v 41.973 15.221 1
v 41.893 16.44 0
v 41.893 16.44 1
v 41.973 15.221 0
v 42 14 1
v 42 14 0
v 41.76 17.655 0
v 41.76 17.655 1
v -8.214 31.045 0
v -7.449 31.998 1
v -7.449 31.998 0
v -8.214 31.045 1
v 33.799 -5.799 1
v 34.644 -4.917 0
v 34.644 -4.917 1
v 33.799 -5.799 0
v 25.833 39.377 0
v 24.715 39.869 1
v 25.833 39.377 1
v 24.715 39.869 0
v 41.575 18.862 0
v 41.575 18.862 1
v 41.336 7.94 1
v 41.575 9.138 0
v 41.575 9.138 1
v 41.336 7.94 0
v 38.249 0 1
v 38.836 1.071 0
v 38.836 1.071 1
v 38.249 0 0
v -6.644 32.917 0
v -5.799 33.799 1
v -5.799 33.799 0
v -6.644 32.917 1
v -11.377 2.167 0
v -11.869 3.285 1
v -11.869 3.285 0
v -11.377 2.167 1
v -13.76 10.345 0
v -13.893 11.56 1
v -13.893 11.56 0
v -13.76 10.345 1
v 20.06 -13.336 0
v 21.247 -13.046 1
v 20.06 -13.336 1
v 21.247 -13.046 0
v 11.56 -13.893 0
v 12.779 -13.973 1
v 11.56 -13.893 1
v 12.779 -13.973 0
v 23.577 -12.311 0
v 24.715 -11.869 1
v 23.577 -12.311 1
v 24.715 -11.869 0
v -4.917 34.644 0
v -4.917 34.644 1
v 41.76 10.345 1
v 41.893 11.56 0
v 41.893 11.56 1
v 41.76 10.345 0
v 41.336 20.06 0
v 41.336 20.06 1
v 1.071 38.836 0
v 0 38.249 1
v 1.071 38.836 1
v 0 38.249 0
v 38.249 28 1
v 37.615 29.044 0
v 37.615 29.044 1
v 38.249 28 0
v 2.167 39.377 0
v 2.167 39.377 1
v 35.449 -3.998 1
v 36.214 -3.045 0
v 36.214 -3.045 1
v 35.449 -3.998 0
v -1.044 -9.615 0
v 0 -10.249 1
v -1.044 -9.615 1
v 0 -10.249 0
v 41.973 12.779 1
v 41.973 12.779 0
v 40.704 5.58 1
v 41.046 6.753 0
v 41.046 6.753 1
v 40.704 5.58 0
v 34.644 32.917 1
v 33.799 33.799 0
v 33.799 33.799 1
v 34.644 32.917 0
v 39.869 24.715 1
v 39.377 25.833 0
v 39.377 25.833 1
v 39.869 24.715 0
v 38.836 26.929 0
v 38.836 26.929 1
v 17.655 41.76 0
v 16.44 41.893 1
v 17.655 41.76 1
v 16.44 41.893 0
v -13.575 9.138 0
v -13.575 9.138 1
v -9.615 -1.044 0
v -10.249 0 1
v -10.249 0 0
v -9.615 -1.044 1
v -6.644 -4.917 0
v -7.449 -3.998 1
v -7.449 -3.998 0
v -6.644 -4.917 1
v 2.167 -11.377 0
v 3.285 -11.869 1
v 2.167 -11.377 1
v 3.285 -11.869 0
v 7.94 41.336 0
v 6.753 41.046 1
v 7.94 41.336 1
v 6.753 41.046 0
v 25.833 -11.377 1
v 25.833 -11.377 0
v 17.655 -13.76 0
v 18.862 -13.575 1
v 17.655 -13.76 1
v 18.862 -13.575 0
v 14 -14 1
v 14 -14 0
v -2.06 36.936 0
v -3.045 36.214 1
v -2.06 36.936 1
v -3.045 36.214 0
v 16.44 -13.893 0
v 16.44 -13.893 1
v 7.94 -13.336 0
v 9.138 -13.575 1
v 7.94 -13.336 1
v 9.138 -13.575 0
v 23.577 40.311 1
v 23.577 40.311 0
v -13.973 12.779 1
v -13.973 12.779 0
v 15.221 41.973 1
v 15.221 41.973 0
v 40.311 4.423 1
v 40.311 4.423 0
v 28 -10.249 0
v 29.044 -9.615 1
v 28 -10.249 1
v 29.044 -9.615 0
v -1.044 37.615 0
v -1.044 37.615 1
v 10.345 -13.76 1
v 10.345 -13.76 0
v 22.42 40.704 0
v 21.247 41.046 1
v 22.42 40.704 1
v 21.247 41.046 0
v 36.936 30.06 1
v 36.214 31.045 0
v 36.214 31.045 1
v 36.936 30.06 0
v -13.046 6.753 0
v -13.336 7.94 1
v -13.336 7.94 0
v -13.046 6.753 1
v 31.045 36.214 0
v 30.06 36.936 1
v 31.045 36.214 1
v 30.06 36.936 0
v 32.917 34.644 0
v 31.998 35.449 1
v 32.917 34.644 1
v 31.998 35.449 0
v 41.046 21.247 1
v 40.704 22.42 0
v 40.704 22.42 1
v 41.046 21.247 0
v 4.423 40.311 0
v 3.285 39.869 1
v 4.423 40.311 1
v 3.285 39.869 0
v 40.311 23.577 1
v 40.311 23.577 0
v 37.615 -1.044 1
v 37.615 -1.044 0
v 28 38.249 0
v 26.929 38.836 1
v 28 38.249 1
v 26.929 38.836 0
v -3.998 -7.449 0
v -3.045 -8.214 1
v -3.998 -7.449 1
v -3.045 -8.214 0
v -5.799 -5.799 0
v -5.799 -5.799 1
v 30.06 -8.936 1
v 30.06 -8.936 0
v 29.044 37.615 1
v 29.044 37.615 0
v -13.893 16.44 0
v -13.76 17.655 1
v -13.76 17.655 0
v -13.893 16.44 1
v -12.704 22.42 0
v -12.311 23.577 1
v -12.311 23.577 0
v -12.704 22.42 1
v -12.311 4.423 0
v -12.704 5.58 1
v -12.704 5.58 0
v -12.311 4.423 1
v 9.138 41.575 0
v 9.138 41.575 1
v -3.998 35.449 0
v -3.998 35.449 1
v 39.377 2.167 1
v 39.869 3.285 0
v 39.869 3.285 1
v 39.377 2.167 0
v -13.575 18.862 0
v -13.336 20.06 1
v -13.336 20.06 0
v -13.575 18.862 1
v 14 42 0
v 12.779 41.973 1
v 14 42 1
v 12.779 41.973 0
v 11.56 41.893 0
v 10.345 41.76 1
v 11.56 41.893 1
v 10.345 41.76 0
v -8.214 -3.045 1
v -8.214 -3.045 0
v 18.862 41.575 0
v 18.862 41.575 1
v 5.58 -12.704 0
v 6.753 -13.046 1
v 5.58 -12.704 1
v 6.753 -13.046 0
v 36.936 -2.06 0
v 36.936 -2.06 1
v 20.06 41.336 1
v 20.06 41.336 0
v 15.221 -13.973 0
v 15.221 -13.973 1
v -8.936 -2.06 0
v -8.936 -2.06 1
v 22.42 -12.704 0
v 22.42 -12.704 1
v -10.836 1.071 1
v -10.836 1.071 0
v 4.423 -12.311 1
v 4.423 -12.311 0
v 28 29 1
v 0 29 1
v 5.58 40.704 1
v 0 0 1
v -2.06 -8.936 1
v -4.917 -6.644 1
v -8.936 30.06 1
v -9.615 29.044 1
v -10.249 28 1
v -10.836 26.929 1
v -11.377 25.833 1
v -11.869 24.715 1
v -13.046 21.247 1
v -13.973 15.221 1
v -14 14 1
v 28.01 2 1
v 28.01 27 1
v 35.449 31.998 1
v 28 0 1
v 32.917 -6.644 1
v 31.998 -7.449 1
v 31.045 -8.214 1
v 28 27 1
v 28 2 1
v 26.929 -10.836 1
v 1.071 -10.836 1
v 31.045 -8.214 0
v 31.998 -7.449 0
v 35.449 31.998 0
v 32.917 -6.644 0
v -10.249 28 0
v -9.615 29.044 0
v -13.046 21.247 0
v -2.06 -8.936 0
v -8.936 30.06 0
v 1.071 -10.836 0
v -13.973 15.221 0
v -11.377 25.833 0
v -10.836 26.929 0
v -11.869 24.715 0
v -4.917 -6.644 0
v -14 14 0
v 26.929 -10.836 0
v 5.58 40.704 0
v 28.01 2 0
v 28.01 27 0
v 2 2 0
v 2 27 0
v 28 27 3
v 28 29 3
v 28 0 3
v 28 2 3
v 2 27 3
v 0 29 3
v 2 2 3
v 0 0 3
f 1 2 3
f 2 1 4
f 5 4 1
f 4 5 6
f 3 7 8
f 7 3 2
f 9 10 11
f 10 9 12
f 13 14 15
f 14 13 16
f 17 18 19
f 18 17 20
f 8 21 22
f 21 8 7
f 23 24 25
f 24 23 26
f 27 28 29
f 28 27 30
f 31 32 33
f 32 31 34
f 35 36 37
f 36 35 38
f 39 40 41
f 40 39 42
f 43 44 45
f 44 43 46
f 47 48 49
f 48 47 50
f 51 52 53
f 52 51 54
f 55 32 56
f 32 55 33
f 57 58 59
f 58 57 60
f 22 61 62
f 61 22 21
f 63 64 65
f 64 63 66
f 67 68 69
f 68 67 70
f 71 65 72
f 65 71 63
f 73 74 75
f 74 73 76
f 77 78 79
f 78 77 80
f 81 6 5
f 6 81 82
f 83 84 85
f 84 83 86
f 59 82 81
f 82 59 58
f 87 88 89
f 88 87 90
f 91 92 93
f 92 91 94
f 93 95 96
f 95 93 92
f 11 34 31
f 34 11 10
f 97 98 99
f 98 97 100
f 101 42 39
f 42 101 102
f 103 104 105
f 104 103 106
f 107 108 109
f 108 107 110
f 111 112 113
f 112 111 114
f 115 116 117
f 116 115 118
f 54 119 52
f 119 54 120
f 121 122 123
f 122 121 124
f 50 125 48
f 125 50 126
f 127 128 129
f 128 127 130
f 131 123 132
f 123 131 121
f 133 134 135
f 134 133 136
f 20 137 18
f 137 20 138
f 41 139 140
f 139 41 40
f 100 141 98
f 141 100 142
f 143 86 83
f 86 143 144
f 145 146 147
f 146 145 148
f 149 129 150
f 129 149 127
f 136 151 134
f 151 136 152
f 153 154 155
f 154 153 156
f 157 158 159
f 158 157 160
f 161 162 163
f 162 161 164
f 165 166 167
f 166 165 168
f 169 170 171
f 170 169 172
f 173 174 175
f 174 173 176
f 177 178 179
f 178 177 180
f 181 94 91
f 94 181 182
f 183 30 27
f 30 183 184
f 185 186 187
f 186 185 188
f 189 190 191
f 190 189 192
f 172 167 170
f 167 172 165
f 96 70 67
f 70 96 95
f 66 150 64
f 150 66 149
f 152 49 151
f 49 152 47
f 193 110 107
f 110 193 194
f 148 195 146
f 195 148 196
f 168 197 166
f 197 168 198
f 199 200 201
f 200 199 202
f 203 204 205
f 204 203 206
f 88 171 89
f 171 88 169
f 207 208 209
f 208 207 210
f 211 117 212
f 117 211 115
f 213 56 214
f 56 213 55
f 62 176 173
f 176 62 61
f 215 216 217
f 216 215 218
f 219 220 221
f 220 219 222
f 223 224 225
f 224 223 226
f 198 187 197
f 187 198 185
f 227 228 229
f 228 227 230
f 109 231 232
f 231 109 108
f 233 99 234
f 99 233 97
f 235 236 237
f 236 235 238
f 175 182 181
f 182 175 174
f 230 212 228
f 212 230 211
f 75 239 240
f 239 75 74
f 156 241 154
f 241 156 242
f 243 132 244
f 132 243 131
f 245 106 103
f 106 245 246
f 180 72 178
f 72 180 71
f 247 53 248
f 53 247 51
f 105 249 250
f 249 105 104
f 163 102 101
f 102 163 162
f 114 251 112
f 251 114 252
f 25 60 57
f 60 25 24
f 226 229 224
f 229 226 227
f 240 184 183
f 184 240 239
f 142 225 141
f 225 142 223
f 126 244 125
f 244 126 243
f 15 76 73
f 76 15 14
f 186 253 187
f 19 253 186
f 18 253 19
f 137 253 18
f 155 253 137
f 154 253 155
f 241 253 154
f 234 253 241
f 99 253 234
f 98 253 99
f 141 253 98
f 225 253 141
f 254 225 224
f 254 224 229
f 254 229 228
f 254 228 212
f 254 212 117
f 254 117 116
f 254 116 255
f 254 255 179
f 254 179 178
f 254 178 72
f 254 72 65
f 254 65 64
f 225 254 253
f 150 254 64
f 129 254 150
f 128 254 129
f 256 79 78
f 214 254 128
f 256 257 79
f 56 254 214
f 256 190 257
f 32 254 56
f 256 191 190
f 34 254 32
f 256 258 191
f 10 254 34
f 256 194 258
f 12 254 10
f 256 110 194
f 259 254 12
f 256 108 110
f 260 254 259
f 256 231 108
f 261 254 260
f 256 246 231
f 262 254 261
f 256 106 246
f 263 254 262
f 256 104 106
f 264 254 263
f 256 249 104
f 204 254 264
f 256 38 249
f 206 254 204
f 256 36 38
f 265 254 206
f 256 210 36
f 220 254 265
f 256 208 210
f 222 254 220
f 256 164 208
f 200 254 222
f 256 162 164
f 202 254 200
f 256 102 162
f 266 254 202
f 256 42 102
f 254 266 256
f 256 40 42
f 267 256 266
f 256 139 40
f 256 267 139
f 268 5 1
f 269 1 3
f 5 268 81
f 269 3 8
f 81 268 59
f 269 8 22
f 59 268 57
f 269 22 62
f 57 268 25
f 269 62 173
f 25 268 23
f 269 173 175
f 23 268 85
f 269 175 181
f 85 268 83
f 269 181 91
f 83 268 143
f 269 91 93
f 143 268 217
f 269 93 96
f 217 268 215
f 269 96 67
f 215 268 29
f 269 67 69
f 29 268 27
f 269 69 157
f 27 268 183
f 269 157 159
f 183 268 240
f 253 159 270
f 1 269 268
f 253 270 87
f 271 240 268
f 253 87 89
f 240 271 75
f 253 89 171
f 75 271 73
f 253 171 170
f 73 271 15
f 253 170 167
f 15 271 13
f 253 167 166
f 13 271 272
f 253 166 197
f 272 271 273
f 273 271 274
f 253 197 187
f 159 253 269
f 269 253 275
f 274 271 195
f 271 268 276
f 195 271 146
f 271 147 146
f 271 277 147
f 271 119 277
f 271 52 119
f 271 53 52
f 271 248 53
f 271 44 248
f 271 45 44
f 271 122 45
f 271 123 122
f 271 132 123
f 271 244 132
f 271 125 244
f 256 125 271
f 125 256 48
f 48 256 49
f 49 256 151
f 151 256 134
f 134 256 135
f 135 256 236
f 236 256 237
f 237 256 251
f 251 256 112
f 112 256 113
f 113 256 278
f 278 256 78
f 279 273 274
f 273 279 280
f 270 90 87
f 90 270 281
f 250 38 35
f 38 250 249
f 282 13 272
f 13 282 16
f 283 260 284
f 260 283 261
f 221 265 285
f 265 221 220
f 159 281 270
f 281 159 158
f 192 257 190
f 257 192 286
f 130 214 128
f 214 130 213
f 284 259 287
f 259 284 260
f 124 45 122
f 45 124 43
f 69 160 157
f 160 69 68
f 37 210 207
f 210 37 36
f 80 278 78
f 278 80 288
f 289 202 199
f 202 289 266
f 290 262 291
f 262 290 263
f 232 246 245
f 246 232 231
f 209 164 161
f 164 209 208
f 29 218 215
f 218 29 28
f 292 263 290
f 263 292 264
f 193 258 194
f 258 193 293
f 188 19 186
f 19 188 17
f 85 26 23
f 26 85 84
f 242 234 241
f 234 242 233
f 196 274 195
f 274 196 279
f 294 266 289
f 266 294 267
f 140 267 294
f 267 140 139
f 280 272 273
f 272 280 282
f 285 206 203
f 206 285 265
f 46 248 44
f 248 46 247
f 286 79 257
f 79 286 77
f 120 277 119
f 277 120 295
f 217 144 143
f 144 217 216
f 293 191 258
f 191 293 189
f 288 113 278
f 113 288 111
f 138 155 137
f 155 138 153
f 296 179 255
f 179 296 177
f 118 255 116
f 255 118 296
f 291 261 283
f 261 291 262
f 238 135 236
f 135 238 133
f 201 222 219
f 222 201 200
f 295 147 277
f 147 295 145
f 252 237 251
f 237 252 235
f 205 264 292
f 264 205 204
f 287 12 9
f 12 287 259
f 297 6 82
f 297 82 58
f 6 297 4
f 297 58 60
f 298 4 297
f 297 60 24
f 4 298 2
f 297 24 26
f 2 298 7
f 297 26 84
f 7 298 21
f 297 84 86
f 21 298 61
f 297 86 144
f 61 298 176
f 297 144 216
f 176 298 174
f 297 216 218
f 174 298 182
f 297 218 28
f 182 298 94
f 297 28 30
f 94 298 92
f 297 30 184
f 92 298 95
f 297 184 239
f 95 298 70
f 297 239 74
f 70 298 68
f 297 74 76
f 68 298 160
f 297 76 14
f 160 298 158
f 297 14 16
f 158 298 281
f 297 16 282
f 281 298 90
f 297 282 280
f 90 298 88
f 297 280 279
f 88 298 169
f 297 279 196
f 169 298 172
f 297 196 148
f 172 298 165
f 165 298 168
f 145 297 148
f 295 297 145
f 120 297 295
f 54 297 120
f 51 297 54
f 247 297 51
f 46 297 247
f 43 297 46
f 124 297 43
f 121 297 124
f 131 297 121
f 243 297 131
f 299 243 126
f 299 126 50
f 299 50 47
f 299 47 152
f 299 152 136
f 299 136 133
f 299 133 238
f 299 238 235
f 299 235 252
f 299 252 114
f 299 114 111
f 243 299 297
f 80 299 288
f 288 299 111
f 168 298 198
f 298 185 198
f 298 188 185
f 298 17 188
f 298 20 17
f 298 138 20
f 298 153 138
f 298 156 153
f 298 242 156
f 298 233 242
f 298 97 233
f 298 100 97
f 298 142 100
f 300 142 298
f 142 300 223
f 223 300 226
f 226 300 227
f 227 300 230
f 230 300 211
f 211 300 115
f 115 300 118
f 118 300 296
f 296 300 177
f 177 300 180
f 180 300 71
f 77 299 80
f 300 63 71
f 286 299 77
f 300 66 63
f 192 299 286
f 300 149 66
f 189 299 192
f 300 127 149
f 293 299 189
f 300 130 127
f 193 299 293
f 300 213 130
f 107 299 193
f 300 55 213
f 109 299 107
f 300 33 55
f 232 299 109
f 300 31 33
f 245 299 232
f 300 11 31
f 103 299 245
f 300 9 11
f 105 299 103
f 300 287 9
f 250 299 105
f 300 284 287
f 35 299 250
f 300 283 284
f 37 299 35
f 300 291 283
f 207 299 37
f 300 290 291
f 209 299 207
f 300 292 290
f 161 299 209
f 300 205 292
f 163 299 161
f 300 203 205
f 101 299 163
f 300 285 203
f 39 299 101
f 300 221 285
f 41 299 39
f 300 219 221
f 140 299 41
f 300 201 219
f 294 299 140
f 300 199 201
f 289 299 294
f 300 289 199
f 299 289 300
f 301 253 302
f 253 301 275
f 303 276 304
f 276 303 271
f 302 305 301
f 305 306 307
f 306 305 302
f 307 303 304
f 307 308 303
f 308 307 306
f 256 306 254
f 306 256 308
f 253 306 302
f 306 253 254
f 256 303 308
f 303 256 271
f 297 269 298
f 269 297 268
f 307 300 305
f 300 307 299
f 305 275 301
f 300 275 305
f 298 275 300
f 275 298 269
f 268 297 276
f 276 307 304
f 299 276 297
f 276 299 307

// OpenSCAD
// CC BY-SA 4.0, @tamberg

$fn = 144;

module adapter() {
  difference() {
    union() {
      cylinder(1, 26 + 2, 26 + 2);
      translate([0, 0, 2]) cylinder(1, 26.5, 26.5);
      translate([0, 0, 2]) sphere(26);
    }
    translate([0, 0, 3]) sphere(25);
    translate([-26, -26, 8]) cube([52, 52, 26]);
    translate([-26, -26, -26]) cube([52, 52, 26]);
  }
}

module ring() {
  difference() {  
    cylinder(1, 26 + 6, 26 + 6);
    translate([0, 0, -0.01]) cylinder(1.02, 26, 26);    
#    translate([0, -26 + 2, -0.01]) cube([26 + 6, 52 - 4, 1.02]);
  }
}

module frame() {
  difference() {
    union() {
      translate([13 + 1, 13 + 1, 0]) cylinder(1, 26 + 2, 26 + 2);
      translate([0, 0, 1]) cube([24 + 4, 25 + 4, 2]);
    }
    translate([2, 2, -0.01]) cube([24 + 2.01, 25, 3.02]);
  }
}

//adapter();
//translate([0, 0, -1]) rotate([180, 0, 0]) adapter();

//translate([0, 0, 1]) ring();

frame();
